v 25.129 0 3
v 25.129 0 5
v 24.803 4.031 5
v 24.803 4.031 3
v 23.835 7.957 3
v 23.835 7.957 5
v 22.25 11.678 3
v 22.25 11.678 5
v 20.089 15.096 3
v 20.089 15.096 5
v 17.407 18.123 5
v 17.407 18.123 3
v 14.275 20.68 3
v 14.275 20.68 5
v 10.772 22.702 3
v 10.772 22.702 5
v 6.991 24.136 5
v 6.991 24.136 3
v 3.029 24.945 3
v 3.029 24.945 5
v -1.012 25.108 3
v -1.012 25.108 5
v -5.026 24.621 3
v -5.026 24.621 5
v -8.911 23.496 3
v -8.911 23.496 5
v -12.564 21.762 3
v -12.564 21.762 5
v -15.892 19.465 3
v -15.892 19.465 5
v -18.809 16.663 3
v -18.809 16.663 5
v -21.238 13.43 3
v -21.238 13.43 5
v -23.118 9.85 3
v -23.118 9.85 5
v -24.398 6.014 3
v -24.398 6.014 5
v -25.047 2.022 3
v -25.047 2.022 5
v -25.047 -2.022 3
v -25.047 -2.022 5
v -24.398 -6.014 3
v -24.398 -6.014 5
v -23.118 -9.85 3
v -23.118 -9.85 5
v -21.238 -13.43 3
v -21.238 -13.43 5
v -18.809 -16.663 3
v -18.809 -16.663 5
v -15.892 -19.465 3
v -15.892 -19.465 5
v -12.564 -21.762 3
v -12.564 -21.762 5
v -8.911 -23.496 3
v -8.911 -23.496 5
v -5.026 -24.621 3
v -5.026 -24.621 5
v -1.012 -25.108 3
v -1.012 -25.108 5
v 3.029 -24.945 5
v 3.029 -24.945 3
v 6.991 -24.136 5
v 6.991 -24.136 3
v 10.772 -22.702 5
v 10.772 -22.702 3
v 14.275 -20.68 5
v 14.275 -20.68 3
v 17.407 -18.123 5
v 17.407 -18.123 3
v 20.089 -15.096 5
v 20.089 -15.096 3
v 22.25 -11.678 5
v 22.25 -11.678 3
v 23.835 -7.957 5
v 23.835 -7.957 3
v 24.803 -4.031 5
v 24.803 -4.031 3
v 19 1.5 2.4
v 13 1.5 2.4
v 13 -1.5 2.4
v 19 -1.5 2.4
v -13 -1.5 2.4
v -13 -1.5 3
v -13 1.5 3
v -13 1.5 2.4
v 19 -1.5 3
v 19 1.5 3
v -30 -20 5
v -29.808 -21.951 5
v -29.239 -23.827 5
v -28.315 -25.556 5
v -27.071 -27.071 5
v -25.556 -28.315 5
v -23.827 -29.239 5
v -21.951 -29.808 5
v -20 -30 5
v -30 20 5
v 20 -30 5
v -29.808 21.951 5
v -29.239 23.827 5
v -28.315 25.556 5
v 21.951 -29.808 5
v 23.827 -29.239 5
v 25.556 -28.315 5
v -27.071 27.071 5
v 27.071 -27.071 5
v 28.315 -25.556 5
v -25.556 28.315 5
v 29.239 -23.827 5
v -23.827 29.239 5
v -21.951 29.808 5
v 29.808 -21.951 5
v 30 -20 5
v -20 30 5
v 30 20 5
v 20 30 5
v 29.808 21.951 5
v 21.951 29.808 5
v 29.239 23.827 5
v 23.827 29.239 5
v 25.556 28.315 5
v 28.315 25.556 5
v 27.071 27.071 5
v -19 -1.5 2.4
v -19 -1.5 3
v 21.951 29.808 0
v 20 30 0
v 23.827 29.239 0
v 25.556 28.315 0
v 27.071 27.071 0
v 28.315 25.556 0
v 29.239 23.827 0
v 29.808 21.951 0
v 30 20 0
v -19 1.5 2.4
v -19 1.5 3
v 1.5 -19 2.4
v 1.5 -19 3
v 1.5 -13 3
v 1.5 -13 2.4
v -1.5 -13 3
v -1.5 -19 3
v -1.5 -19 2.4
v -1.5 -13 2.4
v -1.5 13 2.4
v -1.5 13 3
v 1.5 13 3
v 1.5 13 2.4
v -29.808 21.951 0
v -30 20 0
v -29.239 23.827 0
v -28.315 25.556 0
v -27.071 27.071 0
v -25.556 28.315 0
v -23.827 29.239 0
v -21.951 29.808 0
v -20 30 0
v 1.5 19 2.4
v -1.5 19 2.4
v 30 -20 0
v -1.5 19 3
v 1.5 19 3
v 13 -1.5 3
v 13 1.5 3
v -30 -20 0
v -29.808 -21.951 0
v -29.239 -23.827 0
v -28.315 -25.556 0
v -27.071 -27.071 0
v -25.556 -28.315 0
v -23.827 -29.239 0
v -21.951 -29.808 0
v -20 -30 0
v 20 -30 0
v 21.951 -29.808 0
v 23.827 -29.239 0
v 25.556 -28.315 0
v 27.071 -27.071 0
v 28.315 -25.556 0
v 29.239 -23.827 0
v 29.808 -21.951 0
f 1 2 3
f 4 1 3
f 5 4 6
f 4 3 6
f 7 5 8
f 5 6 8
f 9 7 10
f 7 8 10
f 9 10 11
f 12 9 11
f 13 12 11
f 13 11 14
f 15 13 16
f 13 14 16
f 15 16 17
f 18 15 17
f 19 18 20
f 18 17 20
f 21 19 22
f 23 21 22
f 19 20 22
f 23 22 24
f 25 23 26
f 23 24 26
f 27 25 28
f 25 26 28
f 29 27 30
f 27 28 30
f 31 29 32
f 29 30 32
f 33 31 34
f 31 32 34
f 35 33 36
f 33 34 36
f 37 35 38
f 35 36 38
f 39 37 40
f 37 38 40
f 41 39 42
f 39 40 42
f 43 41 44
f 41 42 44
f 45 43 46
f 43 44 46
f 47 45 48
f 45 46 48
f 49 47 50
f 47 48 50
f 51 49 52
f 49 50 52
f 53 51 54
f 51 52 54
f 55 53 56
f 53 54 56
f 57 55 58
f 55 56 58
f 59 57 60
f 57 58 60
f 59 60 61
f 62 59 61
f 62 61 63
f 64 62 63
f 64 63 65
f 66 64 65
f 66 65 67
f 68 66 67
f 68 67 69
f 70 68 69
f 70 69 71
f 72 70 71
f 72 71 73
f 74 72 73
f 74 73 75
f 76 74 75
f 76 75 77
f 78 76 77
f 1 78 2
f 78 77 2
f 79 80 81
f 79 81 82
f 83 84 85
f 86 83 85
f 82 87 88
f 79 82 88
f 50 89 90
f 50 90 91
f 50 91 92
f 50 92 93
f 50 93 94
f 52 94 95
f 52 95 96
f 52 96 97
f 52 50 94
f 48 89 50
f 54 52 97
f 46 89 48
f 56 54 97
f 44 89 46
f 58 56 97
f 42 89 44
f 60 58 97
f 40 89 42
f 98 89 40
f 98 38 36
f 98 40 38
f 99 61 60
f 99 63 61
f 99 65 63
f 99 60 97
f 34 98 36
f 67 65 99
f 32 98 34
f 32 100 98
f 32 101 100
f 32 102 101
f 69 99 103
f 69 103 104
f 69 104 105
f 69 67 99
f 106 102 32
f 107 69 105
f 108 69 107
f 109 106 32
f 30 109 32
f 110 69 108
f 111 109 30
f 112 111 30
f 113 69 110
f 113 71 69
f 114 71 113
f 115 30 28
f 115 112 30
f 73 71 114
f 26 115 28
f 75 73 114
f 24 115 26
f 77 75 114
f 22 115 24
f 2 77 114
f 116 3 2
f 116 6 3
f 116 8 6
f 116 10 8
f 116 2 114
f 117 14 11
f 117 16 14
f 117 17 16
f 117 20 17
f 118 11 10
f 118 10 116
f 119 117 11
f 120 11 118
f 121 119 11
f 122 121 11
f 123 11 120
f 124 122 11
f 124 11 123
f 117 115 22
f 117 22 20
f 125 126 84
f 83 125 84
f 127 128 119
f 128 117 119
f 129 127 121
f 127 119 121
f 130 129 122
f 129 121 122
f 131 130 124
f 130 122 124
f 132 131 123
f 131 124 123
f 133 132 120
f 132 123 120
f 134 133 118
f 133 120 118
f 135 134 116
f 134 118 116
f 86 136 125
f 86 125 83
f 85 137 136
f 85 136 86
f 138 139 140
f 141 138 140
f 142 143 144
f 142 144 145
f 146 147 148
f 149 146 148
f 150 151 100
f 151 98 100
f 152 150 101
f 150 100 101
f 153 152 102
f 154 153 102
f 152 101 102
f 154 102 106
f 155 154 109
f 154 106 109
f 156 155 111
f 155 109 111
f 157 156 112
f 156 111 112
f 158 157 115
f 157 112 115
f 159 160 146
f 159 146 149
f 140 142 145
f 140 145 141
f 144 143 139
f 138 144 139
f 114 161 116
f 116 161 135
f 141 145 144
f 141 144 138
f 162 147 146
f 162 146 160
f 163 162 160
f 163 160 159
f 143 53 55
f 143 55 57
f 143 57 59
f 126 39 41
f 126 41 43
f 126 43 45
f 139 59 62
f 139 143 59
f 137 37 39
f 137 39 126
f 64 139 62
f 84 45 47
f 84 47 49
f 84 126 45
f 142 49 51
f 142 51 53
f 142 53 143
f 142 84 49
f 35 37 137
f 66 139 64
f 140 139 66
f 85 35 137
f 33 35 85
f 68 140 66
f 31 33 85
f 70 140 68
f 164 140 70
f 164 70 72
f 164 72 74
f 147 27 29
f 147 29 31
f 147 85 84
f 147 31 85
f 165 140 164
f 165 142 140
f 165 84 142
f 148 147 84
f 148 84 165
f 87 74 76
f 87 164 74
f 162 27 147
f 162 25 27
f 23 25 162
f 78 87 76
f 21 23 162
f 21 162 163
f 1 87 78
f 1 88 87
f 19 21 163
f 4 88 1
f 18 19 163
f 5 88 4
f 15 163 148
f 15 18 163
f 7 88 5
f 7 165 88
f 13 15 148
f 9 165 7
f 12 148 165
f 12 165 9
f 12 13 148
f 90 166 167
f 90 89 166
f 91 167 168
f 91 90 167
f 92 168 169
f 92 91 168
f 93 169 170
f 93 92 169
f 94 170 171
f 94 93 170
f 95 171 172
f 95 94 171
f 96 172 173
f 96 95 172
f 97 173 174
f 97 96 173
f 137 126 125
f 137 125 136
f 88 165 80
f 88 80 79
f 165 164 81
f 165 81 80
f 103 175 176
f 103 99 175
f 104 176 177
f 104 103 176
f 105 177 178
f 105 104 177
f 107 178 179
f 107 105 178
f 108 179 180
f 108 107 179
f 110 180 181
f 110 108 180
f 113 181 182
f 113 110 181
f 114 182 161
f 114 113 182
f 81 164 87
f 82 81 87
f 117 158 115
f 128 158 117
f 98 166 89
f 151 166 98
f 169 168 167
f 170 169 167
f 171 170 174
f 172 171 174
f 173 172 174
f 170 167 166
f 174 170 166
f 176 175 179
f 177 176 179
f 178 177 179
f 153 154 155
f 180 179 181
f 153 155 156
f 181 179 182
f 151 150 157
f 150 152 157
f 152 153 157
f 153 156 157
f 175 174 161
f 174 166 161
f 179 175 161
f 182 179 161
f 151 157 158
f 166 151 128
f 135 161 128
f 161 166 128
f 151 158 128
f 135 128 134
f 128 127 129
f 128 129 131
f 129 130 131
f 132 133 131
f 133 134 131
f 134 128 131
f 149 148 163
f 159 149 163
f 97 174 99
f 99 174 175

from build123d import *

# Parameters (mm, degrees)
F0_W     = 60
F0_H     = 60
F1_DEPTH = 5
F2_R     = 25.12858
F3_DEPTH = 2
F4_R     = 10
F5_W     = 6
F5_H     = 3
F5_W_2   = 3
F5_H_2   = 6
F6_DEPTH = 0.6


with BuildPart() as f1:
    # F0 (on Top) → F1 (new body)
    with BuildSketch(Plane.XY):
        Rectangle(F0_W, F0_H)
    extrude(amount=F1_DEPTH)

    # F2 (on face) → F3 (cut)
    with BuildSketch(Plane.XY.offset(5)):
        Circle(F2_R)
    extrude(amount=-F3_DEPTH, mode=Mode.SUBTRACT)

    # F4
    f4_edges = [f1.edges().sort_by_distance(p)[0] for p in [
        (30, 30, 2.5),
        (30, -30, 2.5),
        (-30, -30, 2.5),
        (-30, 30, 2.5),
    ]]
    fillet(f4_edges, radius=F4_R)

    # F5 (on face) → F6 (cut)
    with BuildSketch(Plane.XY.offset(3)):
        with Locations((16, 0)):
            Rectangle(F5_W, F5_H)
        with Locations((0, 16)):
            Rectangle(F5_W_2, F5_H_2)
        with Locations((-16, 0)):
            Rectangle(F5_W, F5_H)
        with Locations((0, -16)):
            Rectangle(F5_W_2, F5_H_2)
    extrude(amount=-F6_DEPTH, mode=Mode.SUBTRACT)


solid = f1.part
